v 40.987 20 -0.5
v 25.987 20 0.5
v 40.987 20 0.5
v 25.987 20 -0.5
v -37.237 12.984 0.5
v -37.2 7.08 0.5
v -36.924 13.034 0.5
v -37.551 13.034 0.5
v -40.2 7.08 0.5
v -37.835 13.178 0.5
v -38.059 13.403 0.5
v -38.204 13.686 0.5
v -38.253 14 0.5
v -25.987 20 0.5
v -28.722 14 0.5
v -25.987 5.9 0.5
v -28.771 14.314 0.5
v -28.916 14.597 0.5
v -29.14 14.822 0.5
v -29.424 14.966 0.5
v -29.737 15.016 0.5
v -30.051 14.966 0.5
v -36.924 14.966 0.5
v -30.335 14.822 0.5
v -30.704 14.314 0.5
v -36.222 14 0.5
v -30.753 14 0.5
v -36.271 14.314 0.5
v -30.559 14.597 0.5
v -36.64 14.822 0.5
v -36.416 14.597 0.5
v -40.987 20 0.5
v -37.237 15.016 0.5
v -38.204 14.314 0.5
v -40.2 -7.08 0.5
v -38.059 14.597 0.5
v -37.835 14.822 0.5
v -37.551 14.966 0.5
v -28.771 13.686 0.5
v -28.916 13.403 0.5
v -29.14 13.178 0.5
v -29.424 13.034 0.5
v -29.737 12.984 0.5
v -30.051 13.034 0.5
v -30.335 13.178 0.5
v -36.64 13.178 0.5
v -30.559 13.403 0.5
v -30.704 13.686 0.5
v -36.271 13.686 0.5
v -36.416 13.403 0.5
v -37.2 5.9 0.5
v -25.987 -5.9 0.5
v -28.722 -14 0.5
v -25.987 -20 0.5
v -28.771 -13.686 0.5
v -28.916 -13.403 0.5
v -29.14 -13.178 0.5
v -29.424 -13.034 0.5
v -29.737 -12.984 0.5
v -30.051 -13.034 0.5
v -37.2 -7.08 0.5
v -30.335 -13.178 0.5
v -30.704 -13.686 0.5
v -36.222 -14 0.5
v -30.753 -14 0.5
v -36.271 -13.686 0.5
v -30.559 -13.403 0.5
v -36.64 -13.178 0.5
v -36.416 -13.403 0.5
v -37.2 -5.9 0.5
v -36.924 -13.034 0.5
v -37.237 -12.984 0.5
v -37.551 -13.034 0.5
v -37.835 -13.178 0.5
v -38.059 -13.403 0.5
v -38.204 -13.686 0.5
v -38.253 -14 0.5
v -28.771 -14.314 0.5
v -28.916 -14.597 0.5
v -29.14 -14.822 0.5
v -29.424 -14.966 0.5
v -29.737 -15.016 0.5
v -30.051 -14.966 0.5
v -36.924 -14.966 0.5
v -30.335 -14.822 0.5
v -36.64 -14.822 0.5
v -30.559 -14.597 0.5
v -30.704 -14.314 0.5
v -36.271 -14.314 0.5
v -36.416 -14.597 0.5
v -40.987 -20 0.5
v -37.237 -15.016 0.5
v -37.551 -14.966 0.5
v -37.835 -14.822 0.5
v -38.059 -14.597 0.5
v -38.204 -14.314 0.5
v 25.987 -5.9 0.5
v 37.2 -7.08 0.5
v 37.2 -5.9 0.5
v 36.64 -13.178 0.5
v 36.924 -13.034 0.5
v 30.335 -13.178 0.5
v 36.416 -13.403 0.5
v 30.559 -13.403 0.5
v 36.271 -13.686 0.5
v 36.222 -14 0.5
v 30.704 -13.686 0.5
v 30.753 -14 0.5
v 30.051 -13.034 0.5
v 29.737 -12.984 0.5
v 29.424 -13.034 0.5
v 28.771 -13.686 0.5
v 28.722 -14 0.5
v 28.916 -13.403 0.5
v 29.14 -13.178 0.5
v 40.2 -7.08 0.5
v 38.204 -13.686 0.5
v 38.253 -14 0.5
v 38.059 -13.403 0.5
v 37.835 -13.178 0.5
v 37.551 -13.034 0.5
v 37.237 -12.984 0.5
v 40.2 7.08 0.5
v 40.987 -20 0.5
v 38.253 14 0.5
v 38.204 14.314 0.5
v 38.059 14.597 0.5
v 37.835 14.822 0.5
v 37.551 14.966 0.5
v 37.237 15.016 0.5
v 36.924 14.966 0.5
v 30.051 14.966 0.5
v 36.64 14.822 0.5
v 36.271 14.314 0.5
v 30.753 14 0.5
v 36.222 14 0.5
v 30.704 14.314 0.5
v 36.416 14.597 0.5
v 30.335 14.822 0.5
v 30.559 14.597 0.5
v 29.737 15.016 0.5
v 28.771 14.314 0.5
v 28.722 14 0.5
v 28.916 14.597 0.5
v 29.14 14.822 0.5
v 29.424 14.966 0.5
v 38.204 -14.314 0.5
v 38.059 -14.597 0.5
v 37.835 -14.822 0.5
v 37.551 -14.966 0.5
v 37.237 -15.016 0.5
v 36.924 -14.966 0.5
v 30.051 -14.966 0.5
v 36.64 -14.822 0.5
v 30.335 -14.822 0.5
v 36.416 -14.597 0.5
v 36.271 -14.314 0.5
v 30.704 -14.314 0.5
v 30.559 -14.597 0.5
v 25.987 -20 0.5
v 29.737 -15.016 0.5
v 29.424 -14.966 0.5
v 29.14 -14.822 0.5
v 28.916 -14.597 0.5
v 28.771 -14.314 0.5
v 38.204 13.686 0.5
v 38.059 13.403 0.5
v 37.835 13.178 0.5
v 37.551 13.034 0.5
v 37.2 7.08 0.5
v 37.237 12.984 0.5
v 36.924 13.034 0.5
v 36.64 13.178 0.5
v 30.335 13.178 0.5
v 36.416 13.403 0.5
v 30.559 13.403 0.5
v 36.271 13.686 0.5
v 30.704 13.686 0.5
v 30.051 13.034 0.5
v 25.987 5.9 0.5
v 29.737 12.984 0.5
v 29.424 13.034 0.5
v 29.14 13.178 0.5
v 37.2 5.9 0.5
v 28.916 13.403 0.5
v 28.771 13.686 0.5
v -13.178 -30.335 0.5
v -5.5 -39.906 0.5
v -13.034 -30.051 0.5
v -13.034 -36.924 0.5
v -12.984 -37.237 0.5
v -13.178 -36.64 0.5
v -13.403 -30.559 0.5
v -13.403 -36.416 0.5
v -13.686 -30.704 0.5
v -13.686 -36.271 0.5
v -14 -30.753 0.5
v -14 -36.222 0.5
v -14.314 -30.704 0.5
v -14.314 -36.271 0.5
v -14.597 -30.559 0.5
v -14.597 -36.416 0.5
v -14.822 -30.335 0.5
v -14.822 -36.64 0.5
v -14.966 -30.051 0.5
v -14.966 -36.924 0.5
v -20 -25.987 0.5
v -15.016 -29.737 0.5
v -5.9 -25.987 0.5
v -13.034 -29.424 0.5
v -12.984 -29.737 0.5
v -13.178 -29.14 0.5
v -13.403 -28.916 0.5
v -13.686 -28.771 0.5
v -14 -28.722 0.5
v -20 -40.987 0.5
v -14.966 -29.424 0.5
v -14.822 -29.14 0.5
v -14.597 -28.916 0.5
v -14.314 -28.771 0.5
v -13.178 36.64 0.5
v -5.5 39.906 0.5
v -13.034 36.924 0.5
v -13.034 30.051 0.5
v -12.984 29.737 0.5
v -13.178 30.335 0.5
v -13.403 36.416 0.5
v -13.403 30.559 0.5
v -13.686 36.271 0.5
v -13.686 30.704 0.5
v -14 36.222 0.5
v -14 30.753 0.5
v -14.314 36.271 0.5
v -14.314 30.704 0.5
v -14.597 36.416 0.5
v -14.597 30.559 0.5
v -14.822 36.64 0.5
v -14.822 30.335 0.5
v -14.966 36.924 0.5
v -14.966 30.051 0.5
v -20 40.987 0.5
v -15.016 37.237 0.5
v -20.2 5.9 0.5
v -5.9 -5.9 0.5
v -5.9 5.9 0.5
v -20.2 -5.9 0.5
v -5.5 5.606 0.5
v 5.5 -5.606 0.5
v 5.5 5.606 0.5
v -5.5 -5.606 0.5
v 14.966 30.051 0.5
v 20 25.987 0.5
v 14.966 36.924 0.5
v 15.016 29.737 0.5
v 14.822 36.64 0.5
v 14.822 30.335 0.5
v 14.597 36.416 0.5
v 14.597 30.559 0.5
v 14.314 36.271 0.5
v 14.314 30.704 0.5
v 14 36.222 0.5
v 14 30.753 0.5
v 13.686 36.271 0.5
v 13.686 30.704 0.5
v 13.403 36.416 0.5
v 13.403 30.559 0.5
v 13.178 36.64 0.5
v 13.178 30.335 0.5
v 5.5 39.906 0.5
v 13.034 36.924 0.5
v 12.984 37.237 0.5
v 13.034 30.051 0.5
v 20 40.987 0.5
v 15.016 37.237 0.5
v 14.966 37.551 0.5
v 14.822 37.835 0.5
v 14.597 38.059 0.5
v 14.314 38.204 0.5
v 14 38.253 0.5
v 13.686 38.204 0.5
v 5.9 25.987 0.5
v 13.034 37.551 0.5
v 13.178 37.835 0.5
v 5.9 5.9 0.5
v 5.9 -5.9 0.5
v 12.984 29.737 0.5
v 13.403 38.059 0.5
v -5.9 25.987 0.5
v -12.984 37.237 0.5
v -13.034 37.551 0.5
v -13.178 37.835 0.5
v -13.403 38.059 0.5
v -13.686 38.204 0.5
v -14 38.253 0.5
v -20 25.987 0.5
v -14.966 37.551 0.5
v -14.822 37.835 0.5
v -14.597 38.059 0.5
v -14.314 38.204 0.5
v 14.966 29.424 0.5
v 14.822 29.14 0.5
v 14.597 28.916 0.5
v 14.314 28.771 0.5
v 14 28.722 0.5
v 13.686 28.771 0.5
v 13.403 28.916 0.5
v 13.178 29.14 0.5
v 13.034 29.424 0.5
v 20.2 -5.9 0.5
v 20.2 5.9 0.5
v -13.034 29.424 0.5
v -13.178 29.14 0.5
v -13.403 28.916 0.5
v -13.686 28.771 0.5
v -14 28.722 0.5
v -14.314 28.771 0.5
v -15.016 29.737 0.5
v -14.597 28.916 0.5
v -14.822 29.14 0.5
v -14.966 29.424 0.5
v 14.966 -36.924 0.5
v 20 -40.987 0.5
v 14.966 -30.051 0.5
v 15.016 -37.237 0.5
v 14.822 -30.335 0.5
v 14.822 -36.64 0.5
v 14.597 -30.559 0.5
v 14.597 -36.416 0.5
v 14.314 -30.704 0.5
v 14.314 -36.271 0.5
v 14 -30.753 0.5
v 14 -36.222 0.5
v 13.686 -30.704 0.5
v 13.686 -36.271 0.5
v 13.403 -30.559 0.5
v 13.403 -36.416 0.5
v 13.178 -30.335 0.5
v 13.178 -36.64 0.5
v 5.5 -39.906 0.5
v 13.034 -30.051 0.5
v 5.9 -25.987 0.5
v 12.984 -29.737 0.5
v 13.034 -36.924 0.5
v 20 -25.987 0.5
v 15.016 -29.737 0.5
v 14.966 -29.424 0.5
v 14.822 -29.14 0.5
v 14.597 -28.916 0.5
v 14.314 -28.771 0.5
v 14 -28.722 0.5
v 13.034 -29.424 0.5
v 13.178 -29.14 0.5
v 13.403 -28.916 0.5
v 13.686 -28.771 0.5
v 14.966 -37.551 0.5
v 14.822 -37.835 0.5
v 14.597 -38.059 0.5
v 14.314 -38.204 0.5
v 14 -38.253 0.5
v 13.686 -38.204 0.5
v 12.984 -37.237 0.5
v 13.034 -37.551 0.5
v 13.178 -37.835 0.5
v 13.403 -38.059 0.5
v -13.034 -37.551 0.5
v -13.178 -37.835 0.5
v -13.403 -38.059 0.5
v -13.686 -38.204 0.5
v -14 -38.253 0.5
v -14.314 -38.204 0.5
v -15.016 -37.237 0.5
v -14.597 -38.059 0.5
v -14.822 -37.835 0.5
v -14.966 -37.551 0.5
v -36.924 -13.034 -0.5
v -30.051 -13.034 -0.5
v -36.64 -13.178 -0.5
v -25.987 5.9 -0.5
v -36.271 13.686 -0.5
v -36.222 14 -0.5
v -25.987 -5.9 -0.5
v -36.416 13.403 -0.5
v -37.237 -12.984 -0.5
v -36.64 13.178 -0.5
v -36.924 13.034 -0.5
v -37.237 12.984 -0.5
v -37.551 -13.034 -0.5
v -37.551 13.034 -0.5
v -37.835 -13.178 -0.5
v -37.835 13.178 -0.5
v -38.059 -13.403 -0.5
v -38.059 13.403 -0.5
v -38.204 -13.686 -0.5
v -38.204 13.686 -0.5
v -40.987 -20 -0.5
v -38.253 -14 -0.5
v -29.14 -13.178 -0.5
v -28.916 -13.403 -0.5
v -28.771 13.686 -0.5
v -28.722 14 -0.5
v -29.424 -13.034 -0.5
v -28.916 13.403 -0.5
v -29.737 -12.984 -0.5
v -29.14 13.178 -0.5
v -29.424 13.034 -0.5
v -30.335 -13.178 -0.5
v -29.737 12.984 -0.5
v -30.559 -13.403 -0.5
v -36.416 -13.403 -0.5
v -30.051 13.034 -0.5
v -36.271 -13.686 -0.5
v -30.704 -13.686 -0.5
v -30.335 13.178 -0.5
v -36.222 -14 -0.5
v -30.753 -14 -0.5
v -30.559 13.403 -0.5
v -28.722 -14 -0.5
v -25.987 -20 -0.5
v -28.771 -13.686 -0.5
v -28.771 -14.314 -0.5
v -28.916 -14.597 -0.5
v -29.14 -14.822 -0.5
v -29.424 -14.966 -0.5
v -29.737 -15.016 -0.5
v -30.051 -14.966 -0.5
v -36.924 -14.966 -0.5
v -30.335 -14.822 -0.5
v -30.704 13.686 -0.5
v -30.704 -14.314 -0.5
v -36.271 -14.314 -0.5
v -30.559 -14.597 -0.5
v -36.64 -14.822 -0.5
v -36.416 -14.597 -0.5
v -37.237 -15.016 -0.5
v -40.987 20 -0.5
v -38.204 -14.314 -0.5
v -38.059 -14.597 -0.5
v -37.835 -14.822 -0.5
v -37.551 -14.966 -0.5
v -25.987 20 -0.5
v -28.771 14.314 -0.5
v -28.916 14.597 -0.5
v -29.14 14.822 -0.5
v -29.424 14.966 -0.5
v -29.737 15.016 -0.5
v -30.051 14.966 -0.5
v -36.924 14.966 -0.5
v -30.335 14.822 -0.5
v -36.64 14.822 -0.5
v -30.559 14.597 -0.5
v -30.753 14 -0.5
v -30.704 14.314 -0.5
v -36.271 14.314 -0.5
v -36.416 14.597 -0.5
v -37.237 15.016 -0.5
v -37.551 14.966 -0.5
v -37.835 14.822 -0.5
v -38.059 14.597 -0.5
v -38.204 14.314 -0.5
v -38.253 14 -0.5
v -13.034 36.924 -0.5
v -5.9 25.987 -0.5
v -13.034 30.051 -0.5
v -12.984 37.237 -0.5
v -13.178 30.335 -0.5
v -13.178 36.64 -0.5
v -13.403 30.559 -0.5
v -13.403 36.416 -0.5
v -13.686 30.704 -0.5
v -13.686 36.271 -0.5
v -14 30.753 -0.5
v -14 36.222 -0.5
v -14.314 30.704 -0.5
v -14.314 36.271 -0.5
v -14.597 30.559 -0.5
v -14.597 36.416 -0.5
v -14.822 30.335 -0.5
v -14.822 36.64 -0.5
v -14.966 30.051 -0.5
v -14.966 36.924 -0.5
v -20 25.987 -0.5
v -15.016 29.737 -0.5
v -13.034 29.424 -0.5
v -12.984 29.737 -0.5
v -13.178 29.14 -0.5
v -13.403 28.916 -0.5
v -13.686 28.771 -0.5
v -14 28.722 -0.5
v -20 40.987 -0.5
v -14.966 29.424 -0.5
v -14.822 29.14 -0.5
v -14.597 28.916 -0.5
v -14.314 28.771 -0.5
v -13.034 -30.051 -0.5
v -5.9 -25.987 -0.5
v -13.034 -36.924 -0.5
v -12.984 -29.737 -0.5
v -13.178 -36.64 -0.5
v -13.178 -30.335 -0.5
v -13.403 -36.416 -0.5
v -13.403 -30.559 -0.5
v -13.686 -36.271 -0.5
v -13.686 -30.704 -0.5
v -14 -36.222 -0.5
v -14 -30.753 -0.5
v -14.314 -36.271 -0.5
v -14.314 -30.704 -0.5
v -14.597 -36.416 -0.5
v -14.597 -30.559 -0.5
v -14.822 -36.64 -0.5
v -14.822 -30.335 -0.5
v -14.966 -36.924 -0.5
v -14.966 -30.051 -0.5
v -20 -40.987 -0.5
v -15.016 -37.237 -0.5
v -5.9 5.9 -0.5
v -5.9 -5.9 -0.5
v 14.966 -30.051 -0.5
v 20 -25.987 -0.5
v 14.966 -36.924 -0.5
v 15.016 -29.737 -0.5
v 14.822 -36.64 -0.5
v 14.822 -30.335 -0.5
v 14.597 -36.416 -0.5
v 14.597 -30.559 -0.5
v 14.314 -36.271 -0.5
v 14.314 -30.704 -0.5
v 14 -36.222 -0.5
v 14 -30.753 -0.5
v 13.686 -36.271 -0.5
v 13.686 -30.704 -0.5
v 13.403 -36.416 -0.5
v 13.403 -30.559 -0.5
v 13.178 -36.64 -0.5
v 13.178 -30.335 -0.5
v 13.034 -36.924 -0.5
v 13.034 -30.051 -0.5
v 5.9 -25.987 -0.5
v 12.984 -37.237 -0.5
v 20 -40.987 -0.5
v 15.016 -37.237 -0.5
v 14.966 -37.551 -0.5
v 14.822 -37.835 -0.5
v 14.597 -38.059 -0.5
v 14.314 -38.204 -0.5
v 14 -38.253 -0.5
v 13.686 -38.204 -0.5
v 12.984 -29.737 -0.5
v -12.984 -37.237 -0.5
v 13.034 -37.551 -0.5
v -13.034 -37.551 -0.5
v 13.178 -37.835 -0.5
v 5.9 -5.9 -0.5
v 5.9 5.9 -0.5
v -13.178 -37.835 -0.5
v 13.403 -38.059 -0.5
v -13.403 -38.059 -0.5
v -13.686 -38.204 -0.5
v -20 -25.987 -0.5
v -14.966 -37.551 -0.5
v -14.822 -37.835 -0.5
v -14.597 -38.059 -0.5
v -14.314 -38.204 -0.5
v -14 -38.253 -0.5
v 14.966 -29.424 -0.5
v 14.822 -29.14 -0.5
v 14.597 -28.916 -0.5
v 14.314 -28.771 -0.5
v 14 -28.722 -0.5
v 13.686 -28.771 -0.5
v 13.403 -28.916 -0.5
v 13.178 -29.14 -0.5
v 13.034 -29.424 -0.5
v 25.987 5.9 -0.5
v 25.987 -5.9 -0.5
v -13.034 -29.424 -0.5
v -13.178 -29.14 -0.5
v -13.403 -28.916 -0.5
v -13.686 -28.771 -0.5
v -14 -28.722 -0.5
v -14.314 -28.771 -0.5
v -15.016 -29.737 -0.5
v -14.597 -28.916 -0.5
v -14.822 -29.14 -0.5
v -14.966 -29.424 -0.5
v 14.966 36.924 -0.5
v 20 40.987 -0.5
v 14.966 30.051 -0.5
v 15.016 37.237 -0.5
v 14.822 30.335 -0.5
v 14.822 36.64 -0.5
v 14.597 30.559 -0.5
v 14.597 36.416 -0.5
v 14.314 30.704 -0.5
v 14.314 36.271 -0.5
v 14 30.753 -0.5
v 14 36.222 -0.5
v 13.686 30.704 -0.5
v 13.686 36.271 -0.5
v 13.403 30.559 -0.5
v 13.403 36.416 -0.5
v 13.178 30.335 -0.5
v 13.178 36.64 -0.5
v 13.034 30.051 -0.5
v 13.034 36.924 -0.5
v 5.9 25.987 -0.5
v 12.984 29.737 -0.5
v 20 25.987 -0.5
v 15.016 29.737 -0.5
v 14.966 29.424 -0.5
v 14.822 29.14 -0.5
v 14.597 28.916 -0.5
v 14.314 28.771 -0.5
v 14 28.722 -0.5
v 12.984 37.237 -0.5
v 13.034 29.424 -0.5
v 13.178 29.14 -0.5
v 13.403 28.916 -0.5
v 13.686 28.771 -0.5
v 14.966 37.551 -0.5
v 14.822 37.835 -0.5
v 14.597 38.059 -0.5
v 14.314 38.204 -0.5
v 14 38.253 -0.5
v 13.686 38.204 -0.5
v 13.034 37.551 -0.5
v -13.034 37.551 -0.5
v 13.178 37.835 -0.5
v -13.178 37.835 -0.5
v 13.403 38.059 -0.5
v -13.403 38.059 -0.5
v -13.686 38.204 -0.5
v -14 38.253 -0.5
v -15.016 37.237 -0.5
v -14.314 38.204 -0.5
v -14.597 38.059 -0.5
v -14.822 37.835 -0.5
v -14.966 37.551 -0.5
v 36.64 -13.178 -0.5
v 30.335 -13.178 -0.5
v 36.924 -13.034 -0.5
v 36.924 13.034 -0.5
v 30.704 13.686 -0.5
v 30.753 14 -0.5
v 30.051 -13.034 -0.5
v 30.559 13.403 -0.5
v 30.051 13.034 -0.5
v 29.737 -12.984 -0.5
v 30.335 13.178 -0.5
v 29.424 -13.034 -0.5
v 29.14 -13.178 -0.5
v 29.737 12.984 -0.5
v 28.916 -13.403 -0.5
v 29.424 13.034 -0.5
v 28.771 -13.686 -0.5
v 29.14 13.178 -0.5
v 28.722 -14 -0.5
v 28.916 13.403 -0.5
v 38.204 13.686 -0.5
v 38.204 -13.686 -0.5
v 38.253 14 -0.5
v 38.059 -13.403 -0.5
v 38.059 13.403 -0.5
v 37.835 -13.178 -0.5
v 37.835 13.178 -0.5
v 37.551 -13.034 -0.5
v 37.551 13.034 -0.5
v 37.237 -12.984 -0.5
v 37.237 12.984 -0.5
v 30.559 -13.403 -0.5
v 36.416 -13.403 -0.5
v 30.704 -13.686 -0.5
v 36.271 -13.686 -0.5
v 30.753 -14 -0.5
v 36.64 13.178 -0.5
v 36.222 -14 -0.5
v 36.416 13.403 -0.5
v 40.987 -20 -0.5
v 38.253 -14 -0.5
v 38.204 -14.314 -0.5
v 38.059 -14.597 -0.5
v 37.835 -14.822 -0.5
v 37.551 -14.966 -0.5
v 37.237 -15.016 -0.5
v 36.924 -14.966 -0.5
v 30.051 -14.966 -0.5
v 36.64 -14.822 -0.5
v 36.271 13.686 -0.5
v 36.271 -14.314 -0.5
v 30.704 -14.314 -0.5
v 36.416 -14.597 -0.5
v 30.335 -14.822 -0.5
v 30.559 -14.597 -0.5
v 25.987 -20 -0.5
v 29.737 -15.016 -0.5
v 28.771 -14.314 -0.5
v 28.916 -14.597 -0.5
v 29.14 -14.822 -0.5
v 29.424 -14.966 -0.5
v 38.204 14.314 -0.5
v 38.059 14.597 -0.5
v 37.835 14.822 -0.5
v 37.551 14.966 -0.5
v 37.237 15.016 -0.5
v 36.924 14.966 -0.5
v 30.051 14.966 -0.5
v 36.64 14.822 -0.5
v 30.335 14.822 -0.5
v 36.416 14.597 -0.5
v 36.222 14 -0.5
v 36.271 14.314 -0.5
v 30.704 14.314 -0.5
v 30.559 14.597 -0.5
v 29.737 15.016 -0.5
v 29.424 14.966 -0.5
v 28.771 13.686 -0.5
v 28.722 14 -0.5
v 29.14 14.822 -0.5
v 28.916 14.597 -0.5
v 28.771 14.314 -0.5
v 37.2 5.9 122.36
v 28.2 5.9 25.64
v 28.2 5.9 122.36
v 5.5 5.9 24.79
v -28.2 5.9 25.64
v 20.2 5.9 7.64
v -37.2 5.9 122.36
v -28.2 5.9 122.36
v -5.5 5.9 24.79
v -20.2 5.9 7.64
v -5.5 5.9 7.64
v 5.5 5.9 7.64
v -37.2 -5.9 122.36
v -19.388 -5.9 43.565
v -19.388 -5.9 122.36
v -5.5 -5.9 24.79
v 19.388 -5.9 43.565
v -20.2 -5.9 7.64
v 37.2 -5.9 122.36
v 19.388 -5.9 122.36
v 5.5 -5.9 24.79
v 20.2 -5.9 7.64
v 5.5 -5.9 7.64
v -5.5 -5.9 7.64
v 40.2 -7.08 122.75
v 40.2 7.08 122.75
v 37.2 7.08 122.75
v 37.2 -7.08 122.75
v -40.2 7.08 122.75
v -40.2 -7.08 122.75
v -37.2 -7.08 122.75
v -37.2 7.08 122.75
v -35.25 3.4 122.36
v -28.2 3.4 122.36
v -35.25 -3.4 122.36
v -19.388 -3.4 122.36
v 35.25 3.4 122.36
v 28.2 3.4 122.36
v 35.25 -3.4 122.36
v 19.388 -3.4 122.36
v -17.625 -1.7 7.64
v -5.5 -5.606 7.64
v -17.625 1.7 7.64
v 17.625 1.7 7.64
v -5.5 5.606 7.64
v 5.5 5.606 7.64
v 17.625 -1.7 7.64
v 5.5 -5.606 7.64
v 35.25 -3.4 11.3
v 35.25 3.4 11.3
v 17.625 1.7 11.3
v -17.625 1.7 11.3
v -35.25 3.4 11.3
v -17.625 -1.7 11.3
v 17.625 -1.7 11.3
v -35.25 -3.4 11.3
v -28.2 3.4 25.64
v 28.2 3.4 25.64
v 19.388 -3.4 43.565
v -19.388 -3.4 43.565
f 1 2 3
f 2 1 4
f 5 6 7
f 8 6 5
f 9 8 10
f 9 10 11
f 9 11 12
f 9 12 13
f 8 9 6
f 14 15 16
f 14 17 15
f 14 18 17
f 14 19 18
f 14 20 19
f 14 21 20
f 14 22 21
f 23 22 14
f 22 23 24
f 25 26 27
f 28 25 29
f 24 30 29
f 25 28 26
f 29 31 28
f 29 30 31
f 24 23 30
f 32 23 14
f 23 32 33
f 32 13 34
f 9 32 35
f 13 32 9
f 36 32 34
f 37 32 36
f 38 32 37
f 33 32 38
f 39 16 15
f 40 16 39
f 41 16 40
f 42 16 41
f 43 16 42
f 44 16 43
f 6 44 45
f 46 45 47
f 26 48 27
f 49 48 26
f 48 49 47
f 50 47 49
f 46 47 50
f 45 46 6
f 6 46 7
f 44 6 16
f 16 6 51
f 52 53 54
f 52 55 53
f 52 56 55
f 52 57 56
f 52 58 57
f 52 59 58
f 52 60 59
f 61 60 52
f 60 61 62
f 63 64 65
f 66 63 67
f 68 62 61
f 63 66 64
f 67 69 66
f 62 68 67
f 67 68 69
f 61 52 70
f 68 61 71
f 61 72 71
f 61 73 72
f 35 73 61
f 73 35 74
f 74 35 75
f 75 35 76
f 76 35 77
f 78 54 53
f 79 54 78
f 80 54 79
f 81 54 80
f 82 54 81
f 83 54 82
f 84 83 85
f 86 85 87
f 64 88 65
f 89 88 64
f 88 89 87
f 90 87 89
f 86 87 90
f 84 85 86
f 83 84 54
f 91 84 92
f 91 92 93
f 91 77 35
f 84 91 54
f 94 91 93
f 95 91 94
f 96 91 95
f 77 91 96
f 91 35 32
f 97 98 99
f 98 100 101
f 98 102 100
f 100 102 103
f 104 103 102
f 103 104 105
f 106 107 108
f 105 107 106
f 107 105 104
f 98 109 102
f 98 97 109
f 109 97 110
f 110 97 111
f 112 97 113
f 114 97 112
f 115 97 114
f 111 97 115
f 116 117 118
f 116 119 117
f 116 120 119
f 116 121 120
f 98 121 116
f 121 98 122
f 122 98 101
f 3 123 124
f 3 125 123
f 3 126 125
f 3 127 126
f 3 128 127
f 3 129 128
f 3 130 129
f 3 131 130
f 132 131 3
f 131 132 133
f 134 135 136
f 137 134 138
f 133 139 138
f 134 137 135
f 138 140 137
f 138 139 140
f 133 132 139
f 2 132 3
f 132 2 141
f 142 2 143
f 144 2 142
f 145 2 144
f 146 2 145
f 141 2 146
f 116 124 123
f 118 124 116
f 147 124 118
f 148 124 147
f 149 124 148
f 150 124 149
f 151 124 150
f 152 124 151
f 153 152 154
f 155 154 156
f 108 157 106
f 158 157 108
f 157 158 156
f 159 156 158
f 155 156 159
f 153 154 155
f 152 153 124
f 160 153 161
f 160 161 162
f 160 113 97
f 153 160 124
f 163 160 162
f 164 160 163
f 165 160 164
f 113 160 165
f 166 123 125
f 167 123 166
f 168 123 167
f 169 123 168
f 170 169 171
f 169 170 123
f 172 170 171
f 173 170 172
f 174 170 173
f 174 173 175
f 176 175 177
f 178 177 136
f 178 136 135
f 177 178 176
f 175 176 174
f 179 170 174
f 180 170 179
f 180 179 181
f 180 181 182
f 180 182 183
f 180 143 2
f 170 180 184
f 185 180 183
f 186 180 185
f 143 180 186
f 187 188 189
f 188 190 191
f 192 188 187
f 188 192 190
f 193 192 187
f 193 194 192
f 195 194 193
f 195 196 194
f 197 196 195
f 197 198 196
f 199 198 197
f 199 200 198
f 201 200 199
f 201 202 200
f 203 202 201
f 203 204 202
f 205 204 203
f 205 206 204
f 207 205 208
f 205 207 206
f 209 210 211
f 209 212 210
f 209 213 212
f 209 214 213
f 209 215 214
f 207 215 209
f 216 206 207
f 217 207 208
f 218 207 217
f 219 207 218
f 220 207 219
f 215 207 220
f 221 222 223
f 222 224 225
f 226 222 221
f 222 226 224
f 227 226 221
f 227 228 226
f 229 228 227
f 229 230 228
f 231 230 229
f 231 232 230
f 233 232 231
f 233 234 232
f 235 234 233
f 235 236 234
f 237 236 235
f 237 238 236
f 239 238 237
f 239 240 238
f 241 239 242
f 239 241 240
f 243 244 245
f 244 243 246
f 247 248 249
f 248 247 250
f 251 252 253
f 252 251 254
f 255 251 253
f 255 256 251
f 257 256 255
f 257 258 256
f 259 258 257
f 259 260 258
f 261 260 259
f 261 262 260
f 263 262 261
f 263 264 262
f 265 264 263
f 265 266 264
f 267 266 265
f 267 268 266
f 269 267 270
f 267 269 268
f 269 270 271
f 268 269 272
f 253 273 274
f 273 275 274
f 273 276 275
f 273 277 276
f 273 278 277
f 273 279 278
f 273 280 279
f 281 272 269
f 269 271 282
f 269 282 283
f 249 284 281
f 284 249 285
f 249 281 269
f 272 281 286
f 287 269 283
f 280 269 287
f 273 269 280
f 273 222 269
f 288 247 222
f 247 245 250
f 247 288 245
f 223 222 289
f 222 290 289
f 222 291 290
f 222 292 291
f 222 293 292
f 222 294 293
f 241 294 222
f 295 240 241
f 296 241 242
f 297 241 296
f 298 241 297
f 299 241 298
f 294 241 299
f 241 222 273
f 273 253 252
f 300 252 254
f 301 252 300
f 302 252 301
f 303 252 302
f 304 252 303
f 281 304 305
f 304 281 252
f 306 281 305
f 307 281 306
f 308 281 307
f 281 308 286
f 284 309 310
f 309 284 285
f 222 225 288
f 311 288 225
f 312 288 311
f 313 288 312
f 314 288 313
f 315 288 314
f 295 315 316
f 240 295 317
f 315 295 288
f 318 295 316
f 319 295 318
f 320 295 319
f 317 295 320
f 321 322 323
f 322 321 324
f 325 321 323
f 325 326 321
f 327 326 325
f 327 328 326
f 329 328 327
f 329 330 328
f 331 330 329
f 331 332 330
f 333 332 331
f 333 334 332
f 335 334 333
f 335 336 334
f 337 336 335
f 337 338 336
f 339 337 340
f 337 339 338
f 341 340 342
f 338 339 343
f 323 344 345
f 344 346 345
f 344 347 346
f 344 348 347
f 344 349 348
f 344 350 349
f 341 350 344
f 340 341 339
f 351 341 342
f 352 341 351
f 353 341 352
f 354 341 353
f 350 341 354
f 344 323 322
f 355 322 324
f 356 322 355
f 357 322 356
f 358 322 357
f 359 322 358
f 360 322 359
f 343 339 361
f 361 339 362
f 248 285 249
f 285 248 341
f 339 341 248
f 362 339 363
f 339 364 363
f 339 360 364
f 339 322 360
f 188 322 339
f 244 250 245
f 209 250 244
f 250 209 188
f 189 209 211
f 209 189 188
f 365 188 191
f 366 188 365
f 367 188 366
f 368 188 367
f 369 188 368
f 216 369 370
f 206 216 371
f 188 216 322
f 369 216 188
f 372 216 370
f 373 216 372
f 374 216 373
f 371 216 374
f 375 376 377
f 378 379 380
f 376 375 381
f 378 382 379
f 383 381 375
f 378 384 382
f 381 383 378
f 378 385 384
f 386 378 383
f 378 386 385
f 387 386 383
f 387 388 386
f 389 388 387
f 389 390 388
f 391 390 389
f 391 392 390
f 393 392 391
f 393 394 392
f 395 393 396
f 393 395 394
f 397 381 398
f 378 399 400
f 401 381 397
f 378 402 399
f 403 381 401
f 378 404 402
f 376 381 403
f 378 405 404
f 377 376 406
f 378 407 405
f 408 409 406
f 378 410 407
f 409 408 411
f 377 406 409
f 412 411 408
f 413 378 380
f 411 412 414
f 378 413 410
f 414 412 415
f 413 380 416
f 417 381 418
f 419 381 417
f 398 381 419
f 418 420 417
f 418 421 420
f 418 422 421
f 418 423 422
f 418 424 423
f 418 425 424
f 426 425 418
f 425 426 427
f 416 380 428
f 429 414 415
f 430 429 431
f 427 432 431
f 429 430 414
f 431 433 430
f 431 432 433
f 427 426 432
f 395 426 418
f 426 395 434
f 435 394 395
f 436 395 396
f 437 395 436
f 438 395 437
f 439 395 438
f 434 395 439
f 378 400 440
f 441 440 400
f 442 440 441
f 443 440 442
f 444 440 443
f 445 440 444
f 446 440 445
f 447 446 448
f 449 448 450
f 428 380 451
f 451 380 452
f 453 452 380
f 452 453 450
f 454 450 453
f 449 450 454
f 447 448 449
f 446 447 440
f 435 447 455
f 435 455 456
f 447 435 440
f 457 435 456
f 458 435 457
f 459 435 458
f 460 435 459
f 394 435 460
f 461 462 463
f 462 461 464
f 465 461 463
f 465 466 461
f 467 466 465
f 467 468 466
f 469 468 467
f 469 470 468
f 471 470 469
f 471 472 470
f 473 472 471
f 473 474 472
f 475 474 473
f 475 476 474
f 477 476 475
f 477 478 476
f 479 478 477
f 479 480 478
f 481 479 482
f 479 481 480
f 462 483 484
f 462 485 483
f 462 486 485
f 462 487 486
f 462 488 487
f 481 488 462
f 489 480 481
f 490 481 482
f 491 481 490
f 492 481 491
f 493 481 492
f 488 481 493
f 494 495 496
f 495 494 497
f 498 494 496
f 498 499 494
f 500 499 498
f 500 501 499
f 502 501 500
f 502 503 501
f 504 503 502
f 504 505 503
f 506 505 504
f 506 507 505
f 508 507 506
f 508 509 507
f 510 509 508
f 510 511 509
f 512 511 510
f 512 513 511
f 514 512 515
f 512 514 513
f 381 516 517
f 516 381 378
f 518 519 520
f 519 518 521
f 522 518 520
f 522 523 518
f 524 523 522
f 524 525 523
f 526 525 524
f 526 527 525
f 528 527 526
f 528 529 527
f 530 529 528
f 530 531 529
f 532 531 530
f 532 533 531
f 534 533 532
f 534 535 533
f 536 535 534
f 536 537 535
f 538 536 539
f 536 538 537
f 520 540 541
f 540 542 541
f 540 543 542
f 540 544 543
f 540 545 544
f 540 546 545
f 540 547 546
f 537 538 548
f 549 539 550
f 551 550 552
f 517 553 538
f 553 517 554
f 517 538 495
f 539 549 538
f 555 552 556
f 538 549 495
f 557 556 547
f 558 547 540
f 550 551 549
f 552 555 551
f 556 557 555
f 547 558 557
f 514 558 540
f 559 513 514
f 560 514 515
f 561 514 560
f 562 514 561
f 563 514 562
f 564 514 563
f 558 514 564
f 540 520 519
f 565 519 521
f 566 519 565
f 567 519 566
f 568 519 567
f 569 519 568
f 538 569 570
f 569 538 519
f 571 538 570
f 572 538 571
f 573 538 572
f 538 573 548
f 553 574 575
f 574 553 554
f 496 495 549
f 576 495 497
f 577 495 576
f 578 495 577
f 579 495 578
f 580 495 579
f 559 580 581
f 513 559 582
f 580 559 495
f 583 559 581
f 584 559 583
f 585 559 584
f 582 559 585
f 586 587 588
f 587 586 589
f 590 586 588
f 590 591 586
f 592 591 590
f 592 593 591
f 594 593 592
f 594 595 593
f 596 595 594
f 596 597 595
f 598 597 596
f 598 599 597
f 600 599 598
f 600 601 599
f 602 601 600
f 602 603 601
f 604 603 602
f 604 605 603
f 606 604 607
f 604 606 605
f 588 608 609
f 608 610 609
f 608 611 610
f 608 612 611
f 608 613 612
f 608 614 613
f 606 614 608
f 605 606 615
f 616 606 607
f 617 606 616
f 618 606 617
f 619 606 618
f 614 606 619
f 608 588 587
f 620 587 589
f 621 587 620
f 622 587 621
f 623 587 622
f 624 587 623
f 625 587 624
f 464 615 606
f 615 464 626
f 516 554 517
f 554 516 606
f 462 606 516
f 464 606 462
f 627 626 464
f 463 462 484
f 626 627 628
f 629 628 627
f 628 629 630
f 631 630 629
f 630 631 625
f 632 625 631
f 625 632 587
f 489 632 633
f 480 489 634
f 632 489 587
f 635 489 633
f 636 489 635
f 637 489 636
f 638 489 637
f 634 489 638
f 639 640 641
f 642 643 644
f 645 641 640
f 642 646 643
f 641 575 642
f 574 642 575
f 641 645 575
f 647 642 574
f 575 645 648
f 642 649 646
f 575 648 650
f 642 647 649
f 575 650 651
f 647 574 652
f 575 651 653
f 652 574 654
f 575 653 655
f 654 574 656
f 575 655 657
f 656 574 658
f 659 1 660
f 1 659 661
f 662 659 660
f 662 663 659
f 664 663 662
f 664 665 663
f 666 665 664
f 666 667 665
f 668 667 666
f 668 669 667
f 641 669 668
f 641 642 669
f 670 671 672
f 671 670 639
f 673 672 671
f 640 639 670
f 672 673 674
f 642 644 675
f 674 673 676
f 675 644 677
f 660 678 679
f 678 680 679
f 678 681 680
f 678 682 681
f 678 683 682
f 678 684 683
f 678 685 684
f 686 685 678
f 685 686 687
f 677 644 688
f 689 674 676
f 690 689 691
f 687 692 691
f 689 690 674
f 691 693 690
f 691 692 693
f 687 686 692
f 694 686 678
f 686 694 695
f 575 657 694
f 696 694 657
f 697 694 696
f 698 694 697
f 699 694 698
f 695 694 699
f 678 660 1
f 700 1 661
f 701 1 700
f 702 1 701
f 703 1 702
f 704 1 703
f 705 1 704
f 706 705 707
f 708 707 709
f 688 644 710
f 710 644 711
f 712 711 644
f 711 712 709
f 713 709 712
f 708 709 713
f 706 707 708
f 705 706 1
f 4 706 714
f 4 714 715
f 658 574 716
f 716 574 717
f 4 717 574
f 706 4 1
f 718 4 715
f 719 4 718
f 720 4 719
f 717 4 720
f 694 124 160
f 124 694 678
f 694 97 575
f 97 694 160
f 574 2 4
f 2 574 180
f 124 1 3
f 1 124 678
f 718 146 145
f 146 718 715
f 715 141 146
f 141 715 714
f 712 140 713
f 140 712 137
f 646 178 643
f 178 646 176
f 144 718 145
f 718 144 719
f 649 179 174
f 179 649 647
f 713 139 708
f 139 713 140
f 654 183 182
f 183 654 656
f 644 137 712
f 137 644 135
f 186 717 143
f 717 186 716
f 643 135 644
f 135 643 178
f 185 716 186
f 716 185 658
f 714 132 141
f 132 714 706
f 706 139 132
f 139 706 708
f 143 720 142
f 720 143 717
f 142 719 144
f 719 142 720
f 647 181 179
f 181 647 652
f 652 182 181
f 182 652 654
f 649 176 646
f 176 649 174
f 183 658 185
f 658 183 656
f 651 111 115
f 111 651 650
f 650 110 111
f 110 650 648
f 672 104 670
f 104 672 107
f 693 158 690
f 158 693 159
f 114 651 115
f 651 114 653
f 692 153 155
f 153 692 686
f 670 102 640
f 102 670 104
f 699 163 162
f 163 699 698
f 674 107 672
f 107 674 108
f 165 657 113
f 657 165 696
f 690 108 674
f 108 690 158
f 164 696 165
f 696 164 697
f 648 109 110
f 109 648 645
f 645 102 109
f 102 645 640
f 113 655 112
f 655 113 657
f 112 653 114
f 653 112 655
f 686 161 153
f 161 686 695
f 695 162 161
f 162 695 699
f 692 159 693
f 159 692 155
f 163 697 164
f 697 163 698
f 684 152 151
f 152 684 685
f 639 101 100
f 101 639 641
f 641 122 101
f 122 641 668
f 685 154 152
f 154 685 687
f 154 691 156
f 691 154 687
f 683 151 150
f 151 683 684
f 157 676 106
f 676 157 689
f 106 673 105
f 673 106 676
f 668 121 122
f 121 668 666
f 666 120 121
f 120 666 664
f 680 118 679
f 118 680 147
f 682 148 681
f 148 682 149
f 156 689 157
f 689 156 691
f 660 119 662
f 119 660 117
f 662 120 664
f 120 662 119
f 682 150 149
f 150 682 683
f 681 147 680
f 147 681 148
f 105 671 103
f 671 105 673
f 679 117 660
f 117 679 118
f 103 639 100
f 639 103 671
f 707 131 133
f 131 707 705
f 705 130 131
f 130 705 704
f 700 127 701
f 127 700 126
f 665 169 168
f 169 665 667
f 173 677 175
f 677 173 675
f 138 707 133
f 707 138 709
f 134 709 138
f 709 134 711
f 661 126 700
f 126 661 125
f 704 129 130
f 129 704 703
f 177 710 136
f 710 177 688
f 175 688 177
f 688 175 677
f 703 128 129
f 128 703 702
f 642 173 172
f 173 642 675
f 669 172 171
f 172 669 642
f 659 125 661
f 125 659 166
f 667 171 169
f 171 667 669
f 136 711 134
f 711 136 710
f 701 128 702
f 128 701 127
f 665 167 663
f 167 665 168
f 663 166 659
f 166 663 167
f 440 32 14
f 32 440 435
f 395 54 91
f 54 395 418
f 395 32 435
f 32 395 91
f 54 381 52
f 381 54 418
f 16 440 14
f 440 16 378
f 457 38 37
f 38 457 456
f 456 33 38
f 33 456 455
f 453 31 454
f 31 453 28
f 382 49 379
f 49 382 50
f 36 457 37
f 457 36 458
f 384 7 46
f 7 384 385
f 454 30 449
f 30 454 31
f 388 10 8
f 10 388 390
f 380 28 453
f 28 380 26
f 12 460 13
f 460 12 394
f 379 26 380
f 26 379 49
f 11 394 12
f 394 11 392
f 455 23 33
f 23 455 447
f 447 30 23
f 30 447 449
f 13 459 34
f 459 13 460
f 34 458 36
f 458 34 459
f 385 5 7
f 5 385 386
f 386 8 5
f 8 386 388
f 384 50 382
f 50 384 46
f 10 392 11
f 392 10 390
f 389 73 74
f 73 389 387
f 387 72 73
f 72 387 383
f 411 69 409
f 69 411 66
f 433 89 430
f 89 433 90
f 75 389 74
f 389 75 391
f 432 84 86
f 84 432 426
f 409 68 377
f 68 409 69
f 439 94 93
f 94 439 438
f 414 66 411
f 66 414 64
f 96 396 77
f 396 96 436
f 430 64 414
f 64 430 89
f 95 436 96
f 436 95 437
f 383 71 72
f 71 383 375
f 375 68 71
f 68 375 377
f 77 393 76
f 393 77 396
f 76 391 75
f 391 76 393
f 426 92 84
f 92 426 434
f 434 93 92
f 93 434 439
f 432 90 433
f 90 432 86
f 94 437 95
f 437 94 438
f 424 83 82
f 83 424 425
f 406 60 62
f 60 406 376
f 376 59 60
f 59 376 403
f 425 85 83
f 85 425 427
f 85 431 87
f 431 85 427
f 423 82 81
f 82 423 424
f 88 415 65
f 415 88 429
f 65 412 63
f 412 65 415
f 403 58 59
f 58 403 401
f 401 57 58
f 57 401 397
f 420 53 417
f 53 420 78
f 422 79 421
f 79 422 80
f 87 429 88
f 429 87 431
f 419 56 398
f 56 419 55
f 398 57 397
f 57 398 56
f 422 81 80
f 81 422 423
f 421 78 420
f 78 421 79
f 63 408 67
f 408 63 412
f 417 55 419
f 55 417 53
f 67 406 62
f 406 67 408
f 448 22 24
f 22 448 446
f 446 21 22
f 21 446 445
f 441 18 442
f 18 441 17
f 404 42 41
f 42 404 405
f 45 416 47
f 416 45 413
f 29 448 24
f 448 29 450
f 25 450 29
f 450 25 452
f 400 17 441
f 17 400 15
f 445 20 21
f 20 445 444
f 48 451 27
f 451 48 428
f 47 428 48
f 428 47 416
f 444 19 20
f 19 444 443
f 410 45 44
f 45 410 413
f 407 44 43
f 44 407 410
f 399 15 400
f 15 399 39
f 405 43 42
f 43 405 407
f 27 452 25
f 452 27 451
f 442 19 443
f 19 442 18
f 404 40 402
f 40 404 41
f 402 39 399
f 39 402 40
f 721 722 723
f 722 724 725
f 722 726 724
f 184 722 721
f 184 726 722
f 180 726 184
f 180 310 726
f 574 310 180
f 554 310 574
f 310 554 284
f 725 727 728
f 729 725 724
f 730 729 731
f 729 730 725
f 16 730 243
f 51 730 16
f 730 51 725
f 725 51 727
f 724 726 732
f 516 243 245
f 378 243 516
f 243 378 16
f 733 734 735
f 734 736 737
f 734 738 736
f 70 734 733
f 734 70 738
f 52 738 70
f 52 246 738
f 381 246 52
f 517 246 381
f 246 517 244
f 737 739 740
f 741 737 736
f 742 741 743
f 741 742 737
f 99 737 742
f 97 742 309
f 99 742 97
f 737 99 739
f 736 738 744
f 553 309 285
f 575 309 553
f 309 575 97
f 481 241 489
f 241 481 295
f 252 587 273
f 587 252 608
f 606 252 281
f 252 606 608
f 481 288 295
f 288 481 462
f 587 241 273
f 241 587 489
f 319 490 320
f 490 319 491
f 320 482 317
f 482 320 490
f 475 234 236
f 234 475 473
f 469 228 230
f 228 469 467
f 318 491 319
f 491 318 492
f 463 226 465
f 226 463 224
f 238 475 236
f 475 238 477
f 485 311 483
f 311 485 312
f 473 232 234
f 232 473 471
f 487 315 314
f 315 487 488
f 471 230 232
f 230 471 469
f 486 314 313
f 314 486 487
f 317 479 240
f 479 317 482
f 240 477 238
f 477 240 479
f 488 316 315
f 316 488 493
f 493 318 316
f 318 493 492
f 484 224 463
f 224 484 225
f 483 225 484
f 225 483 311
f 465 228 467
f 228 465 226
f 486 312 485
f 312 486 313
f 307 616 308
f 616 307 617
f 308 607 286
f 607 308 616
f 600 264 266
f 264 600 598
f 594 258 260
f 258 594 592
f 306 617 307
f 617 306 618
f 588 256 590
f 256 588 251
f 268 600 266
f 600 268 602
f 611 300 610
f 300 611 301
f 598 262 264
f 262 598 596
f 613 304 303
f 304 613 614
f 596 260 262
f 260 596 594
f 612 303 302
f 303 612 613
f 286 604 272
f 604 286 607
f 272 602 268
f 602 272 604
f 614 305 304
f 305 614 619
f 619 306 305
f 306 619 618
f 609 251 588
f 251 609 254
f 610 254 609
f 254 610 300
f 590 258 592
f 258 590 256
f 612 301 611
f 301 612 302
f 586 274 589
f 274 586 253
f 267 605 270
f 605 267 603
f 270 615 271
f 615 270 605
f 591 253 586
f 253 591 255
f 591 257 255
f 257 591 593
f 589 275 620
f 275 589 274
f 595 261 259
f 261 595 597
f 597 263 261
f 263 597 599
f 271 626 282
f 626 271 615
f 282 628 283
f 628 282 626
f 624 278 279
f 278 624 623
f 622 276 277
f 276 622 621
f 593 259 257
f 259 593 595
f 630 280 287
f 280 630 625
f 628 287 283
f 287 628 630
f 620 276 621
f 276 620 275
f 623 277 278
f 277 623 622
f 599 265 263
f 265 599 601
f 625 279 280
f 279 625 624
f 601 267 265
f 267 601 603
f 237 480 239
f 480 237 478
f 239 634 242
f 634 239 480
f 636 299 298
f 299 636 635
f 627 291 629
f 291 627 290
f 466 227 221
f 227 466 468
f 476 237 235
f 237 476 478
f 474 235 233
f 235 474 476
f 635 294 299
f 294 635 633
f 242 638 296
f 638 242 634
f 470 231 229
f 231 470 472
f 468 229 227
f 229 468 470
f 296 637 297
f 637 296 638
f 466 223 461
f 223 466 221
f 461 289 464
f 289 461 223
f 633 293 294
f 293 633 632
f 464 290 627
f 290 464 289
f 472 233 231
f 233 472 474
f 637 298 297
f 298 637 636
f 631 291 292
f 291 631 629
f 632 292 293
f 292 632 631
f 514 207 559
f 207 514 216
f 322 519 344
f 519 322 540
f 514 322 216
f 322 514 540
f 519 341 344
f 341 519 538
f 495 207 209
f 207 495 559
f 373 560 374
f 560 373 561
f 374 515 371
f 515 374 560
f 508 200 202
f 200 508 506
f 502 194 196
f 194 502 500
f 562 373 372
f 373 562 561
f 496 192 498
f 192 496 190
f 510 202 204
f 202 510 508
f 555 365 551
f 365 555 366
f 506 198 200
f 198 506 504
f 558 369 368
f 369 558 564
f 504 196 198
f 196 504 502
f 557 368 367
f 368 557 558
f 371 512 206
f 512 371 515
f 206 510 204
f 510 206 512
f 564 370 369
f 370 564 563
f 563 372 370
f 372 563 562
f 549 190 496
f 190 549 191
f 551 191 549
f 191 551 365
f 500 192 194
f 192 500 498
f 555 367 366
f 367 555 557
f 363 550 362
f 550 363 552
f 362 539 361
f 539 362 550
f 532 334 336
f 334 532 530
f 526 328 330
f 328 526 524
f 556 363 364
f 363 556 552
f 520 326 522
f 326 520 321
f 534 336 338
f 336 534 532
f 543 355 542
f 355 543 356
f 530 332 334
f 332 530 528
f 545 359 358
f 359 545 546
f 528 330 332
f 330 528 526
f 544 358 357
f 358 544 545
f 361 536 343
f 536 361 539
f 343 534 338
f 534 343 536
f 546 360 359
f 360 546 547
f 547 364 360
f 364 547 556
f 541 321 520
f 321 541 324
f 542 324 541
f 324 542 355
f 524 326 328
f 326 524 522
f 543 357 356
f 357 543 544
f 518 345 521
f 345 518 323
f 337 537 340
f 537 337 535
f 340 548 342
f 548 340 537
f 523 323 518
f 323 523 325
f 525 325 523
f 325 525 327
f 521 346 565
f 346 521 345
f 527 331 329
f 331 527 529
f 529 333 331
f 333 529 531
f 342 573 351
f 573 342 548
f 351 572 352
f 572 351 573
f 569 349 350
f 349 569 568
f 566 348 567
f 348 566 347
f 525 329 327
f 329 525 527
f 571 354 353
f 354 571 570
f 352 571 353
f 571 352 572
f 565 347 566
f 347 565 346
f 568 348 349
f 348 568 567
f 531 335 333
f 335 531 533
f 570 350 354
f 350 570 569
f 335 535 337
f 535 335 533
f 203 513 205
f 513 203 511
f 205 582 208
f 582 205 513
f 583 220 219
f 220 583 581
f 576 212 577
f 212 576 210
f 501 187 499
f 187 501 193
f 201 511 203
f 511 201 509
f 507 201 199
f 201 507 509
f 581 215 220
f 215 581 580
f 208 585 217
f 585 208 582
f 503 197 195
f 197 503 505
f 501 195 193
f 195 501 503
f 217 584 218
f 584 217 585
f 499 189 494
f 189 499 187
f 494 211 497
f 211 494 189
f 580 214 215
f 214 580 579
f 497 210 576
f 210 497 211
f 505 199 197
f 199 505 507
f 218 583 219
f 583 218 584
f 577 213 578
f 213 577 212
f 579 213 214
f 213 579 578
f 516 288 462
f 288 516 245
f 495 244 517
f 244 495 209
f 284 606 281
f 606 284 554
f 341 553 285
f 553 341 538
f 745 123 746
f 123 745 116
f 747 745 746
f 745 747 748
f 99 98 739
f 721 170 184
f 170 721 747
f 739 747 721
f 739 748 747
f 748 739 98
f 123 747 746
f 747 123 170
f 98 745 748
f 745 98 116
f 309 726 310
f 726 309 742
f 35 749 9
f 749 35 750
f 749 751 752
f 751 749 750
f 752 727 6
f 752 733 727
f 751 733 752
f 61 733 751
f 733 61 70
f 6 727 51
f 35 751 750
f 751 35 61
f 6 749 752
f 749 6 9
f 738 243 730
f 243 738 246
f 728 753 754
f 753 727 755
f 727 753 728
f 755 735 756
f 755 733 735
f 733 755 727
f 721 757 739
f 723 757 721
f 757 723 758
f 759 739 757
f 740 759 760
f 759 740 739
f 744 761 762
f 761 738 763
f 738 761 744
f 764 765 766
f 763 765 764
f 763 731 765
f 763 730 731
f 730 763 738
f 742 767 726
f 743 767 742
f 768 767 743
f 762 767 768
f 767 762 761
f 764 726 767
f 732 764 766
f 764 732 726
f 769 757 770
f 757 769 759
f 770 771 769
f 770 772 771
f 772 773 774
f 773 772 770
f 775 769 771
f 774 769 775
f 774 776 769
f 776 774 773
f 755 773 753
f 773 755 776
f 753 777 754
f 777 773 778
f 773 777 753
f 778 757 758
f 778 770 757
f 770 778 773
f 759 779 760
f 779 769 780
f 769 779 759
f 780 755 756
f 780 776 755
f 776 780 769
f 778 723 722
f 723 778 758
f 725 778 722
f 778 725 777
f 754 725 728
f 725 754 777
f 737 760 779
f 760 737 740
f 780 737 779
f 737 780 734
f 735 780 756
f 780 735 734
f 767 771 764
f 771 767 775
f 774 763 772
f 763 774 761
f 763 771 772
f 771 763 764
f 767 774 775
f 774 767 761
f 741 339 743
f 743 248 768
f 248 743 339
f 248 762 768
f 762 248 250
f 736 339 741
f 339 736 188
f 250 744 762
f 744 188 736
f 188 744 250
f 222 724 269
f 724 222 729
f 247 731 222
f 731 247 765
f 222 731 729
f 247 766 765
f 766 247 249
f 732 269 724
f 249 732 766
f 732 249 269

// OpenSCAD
width = 40;
height = 15;
screw_offset_x = .35 * width;
screw_offset_y = .25 * height;
screw_radius = 1.016;
screw_height = 3;
res=20;

phone_width = 70.5;
phone_depth = 6.8;
phone_height = 143.4;

casing_wiggle = 5;
casing_depth = phone_depth + casing_wiggle; 
casing_width = phone_width + casing_wiggle; 
casing_height = phone_height * .8;

screw_mount_placement =  ( .95 * phone_width ) / 2;


// Uncomment the below line to get the 2d projection
//projection( cut=true)
union() {
    // Draw primary stand
    rotate(90) 
    BaseStation();
    BaseStation();
    
    // Draw triangular supports
    Support();
    rotate(180)
    Support();
    
    // Draw vertical supports
    translate( [.8*casing_width/2,0,0] ) 
    HorizontalSupport();
    translate( [-.8*casing_width/2,0,0] )
    rotate(180)
    HorizontalSupport();

    // Draw the phone case itself
    translate( [0,0, 65 ] ) {  
        DrawCase();  
    }
}


//translate( [0,0,80] )
//DrawPhone();

// Tringular Support
module Support( l=11,w=35,h=25) {
    translate( [ 0,  -.69 * screw_mount_placement, 0 ] )
    prism(l,w,h);
}

module VerticalSupport( height=1 ) {
    width = casing_depth * 1.2;
    translate( [7,width/-2,0] )
    cube( [3,width,height]);
}

module HorizontalSupport(height=10) {
    VerticalSupport(casing_height*1.07);
    translate([0,0,height/2])
    cube([20,casing_depth ,height], center=true);
}

module BaseStation() {
    union () {
    cube( [screw_mount_placement * 2, casing_depth, 1] , center=true);
    ScrewMount( screw_mount_placement,0,0);
    ScrewMount( -1 * screw_mount_placement,0,0);
    }
}


module DrawPhone( v = [0,0,0], s=1) {
        translate(v)
        cube( [s*phone_width , s*phone_depth, s*phone_height ], center = true );
}

module DrawCase() {
        y_off = 18;
        difference() {
            rotate(90)
            cube( [ casing_depth, casing_width, casing_height  ], center = true );
            DrawPhone([0,0,y_off]);
            DrawPhone([0,5,y_off], s=.8);
            DrawPhone([0,-5,y_off], s=.55);
            DrawPhone([0,0,-30], s=.5);
            
        }
        
}

module Screw(x,y,z) {
    translate( [x,y,z] )
    cylinder( screw_height, screw_radius, screw_radius, $fn=res, center = true );
}


module ScrewMount(x,y,z) {
    translate( [x,y,z] )
    rotate( 90 ) // Rotate for placement
    // Subtract screw holes from base
    difference()  {
        // Draw base
        cube( [width,height,1], center = true );
        // Draw screw holes
        Screw(screw_offset_x, screw_offset_y, 0);
        Screw(-1 * screw_offset_x, screw_offset_y, 0);
        Screw(-1 * screw_offset_x, -1 * screw_offset_y, 0);
        Screw(screw_offset_x, -1 * screw_offset_y, 0);
    
    }
}


module prism(l, w, h){
       translate([ -1 * l/2, -1 *  w/2,0])
       polyhedron(
               points=[[0,0,0], [l,0,0], [l,w,0], [0,w,0], [0,w,h], [l,w,h]],
               faces=[[0,1,2,3],[5,4,3,2],[0,4,5,1],[0,3,4],[5,2,1]]
               );
       

 }
